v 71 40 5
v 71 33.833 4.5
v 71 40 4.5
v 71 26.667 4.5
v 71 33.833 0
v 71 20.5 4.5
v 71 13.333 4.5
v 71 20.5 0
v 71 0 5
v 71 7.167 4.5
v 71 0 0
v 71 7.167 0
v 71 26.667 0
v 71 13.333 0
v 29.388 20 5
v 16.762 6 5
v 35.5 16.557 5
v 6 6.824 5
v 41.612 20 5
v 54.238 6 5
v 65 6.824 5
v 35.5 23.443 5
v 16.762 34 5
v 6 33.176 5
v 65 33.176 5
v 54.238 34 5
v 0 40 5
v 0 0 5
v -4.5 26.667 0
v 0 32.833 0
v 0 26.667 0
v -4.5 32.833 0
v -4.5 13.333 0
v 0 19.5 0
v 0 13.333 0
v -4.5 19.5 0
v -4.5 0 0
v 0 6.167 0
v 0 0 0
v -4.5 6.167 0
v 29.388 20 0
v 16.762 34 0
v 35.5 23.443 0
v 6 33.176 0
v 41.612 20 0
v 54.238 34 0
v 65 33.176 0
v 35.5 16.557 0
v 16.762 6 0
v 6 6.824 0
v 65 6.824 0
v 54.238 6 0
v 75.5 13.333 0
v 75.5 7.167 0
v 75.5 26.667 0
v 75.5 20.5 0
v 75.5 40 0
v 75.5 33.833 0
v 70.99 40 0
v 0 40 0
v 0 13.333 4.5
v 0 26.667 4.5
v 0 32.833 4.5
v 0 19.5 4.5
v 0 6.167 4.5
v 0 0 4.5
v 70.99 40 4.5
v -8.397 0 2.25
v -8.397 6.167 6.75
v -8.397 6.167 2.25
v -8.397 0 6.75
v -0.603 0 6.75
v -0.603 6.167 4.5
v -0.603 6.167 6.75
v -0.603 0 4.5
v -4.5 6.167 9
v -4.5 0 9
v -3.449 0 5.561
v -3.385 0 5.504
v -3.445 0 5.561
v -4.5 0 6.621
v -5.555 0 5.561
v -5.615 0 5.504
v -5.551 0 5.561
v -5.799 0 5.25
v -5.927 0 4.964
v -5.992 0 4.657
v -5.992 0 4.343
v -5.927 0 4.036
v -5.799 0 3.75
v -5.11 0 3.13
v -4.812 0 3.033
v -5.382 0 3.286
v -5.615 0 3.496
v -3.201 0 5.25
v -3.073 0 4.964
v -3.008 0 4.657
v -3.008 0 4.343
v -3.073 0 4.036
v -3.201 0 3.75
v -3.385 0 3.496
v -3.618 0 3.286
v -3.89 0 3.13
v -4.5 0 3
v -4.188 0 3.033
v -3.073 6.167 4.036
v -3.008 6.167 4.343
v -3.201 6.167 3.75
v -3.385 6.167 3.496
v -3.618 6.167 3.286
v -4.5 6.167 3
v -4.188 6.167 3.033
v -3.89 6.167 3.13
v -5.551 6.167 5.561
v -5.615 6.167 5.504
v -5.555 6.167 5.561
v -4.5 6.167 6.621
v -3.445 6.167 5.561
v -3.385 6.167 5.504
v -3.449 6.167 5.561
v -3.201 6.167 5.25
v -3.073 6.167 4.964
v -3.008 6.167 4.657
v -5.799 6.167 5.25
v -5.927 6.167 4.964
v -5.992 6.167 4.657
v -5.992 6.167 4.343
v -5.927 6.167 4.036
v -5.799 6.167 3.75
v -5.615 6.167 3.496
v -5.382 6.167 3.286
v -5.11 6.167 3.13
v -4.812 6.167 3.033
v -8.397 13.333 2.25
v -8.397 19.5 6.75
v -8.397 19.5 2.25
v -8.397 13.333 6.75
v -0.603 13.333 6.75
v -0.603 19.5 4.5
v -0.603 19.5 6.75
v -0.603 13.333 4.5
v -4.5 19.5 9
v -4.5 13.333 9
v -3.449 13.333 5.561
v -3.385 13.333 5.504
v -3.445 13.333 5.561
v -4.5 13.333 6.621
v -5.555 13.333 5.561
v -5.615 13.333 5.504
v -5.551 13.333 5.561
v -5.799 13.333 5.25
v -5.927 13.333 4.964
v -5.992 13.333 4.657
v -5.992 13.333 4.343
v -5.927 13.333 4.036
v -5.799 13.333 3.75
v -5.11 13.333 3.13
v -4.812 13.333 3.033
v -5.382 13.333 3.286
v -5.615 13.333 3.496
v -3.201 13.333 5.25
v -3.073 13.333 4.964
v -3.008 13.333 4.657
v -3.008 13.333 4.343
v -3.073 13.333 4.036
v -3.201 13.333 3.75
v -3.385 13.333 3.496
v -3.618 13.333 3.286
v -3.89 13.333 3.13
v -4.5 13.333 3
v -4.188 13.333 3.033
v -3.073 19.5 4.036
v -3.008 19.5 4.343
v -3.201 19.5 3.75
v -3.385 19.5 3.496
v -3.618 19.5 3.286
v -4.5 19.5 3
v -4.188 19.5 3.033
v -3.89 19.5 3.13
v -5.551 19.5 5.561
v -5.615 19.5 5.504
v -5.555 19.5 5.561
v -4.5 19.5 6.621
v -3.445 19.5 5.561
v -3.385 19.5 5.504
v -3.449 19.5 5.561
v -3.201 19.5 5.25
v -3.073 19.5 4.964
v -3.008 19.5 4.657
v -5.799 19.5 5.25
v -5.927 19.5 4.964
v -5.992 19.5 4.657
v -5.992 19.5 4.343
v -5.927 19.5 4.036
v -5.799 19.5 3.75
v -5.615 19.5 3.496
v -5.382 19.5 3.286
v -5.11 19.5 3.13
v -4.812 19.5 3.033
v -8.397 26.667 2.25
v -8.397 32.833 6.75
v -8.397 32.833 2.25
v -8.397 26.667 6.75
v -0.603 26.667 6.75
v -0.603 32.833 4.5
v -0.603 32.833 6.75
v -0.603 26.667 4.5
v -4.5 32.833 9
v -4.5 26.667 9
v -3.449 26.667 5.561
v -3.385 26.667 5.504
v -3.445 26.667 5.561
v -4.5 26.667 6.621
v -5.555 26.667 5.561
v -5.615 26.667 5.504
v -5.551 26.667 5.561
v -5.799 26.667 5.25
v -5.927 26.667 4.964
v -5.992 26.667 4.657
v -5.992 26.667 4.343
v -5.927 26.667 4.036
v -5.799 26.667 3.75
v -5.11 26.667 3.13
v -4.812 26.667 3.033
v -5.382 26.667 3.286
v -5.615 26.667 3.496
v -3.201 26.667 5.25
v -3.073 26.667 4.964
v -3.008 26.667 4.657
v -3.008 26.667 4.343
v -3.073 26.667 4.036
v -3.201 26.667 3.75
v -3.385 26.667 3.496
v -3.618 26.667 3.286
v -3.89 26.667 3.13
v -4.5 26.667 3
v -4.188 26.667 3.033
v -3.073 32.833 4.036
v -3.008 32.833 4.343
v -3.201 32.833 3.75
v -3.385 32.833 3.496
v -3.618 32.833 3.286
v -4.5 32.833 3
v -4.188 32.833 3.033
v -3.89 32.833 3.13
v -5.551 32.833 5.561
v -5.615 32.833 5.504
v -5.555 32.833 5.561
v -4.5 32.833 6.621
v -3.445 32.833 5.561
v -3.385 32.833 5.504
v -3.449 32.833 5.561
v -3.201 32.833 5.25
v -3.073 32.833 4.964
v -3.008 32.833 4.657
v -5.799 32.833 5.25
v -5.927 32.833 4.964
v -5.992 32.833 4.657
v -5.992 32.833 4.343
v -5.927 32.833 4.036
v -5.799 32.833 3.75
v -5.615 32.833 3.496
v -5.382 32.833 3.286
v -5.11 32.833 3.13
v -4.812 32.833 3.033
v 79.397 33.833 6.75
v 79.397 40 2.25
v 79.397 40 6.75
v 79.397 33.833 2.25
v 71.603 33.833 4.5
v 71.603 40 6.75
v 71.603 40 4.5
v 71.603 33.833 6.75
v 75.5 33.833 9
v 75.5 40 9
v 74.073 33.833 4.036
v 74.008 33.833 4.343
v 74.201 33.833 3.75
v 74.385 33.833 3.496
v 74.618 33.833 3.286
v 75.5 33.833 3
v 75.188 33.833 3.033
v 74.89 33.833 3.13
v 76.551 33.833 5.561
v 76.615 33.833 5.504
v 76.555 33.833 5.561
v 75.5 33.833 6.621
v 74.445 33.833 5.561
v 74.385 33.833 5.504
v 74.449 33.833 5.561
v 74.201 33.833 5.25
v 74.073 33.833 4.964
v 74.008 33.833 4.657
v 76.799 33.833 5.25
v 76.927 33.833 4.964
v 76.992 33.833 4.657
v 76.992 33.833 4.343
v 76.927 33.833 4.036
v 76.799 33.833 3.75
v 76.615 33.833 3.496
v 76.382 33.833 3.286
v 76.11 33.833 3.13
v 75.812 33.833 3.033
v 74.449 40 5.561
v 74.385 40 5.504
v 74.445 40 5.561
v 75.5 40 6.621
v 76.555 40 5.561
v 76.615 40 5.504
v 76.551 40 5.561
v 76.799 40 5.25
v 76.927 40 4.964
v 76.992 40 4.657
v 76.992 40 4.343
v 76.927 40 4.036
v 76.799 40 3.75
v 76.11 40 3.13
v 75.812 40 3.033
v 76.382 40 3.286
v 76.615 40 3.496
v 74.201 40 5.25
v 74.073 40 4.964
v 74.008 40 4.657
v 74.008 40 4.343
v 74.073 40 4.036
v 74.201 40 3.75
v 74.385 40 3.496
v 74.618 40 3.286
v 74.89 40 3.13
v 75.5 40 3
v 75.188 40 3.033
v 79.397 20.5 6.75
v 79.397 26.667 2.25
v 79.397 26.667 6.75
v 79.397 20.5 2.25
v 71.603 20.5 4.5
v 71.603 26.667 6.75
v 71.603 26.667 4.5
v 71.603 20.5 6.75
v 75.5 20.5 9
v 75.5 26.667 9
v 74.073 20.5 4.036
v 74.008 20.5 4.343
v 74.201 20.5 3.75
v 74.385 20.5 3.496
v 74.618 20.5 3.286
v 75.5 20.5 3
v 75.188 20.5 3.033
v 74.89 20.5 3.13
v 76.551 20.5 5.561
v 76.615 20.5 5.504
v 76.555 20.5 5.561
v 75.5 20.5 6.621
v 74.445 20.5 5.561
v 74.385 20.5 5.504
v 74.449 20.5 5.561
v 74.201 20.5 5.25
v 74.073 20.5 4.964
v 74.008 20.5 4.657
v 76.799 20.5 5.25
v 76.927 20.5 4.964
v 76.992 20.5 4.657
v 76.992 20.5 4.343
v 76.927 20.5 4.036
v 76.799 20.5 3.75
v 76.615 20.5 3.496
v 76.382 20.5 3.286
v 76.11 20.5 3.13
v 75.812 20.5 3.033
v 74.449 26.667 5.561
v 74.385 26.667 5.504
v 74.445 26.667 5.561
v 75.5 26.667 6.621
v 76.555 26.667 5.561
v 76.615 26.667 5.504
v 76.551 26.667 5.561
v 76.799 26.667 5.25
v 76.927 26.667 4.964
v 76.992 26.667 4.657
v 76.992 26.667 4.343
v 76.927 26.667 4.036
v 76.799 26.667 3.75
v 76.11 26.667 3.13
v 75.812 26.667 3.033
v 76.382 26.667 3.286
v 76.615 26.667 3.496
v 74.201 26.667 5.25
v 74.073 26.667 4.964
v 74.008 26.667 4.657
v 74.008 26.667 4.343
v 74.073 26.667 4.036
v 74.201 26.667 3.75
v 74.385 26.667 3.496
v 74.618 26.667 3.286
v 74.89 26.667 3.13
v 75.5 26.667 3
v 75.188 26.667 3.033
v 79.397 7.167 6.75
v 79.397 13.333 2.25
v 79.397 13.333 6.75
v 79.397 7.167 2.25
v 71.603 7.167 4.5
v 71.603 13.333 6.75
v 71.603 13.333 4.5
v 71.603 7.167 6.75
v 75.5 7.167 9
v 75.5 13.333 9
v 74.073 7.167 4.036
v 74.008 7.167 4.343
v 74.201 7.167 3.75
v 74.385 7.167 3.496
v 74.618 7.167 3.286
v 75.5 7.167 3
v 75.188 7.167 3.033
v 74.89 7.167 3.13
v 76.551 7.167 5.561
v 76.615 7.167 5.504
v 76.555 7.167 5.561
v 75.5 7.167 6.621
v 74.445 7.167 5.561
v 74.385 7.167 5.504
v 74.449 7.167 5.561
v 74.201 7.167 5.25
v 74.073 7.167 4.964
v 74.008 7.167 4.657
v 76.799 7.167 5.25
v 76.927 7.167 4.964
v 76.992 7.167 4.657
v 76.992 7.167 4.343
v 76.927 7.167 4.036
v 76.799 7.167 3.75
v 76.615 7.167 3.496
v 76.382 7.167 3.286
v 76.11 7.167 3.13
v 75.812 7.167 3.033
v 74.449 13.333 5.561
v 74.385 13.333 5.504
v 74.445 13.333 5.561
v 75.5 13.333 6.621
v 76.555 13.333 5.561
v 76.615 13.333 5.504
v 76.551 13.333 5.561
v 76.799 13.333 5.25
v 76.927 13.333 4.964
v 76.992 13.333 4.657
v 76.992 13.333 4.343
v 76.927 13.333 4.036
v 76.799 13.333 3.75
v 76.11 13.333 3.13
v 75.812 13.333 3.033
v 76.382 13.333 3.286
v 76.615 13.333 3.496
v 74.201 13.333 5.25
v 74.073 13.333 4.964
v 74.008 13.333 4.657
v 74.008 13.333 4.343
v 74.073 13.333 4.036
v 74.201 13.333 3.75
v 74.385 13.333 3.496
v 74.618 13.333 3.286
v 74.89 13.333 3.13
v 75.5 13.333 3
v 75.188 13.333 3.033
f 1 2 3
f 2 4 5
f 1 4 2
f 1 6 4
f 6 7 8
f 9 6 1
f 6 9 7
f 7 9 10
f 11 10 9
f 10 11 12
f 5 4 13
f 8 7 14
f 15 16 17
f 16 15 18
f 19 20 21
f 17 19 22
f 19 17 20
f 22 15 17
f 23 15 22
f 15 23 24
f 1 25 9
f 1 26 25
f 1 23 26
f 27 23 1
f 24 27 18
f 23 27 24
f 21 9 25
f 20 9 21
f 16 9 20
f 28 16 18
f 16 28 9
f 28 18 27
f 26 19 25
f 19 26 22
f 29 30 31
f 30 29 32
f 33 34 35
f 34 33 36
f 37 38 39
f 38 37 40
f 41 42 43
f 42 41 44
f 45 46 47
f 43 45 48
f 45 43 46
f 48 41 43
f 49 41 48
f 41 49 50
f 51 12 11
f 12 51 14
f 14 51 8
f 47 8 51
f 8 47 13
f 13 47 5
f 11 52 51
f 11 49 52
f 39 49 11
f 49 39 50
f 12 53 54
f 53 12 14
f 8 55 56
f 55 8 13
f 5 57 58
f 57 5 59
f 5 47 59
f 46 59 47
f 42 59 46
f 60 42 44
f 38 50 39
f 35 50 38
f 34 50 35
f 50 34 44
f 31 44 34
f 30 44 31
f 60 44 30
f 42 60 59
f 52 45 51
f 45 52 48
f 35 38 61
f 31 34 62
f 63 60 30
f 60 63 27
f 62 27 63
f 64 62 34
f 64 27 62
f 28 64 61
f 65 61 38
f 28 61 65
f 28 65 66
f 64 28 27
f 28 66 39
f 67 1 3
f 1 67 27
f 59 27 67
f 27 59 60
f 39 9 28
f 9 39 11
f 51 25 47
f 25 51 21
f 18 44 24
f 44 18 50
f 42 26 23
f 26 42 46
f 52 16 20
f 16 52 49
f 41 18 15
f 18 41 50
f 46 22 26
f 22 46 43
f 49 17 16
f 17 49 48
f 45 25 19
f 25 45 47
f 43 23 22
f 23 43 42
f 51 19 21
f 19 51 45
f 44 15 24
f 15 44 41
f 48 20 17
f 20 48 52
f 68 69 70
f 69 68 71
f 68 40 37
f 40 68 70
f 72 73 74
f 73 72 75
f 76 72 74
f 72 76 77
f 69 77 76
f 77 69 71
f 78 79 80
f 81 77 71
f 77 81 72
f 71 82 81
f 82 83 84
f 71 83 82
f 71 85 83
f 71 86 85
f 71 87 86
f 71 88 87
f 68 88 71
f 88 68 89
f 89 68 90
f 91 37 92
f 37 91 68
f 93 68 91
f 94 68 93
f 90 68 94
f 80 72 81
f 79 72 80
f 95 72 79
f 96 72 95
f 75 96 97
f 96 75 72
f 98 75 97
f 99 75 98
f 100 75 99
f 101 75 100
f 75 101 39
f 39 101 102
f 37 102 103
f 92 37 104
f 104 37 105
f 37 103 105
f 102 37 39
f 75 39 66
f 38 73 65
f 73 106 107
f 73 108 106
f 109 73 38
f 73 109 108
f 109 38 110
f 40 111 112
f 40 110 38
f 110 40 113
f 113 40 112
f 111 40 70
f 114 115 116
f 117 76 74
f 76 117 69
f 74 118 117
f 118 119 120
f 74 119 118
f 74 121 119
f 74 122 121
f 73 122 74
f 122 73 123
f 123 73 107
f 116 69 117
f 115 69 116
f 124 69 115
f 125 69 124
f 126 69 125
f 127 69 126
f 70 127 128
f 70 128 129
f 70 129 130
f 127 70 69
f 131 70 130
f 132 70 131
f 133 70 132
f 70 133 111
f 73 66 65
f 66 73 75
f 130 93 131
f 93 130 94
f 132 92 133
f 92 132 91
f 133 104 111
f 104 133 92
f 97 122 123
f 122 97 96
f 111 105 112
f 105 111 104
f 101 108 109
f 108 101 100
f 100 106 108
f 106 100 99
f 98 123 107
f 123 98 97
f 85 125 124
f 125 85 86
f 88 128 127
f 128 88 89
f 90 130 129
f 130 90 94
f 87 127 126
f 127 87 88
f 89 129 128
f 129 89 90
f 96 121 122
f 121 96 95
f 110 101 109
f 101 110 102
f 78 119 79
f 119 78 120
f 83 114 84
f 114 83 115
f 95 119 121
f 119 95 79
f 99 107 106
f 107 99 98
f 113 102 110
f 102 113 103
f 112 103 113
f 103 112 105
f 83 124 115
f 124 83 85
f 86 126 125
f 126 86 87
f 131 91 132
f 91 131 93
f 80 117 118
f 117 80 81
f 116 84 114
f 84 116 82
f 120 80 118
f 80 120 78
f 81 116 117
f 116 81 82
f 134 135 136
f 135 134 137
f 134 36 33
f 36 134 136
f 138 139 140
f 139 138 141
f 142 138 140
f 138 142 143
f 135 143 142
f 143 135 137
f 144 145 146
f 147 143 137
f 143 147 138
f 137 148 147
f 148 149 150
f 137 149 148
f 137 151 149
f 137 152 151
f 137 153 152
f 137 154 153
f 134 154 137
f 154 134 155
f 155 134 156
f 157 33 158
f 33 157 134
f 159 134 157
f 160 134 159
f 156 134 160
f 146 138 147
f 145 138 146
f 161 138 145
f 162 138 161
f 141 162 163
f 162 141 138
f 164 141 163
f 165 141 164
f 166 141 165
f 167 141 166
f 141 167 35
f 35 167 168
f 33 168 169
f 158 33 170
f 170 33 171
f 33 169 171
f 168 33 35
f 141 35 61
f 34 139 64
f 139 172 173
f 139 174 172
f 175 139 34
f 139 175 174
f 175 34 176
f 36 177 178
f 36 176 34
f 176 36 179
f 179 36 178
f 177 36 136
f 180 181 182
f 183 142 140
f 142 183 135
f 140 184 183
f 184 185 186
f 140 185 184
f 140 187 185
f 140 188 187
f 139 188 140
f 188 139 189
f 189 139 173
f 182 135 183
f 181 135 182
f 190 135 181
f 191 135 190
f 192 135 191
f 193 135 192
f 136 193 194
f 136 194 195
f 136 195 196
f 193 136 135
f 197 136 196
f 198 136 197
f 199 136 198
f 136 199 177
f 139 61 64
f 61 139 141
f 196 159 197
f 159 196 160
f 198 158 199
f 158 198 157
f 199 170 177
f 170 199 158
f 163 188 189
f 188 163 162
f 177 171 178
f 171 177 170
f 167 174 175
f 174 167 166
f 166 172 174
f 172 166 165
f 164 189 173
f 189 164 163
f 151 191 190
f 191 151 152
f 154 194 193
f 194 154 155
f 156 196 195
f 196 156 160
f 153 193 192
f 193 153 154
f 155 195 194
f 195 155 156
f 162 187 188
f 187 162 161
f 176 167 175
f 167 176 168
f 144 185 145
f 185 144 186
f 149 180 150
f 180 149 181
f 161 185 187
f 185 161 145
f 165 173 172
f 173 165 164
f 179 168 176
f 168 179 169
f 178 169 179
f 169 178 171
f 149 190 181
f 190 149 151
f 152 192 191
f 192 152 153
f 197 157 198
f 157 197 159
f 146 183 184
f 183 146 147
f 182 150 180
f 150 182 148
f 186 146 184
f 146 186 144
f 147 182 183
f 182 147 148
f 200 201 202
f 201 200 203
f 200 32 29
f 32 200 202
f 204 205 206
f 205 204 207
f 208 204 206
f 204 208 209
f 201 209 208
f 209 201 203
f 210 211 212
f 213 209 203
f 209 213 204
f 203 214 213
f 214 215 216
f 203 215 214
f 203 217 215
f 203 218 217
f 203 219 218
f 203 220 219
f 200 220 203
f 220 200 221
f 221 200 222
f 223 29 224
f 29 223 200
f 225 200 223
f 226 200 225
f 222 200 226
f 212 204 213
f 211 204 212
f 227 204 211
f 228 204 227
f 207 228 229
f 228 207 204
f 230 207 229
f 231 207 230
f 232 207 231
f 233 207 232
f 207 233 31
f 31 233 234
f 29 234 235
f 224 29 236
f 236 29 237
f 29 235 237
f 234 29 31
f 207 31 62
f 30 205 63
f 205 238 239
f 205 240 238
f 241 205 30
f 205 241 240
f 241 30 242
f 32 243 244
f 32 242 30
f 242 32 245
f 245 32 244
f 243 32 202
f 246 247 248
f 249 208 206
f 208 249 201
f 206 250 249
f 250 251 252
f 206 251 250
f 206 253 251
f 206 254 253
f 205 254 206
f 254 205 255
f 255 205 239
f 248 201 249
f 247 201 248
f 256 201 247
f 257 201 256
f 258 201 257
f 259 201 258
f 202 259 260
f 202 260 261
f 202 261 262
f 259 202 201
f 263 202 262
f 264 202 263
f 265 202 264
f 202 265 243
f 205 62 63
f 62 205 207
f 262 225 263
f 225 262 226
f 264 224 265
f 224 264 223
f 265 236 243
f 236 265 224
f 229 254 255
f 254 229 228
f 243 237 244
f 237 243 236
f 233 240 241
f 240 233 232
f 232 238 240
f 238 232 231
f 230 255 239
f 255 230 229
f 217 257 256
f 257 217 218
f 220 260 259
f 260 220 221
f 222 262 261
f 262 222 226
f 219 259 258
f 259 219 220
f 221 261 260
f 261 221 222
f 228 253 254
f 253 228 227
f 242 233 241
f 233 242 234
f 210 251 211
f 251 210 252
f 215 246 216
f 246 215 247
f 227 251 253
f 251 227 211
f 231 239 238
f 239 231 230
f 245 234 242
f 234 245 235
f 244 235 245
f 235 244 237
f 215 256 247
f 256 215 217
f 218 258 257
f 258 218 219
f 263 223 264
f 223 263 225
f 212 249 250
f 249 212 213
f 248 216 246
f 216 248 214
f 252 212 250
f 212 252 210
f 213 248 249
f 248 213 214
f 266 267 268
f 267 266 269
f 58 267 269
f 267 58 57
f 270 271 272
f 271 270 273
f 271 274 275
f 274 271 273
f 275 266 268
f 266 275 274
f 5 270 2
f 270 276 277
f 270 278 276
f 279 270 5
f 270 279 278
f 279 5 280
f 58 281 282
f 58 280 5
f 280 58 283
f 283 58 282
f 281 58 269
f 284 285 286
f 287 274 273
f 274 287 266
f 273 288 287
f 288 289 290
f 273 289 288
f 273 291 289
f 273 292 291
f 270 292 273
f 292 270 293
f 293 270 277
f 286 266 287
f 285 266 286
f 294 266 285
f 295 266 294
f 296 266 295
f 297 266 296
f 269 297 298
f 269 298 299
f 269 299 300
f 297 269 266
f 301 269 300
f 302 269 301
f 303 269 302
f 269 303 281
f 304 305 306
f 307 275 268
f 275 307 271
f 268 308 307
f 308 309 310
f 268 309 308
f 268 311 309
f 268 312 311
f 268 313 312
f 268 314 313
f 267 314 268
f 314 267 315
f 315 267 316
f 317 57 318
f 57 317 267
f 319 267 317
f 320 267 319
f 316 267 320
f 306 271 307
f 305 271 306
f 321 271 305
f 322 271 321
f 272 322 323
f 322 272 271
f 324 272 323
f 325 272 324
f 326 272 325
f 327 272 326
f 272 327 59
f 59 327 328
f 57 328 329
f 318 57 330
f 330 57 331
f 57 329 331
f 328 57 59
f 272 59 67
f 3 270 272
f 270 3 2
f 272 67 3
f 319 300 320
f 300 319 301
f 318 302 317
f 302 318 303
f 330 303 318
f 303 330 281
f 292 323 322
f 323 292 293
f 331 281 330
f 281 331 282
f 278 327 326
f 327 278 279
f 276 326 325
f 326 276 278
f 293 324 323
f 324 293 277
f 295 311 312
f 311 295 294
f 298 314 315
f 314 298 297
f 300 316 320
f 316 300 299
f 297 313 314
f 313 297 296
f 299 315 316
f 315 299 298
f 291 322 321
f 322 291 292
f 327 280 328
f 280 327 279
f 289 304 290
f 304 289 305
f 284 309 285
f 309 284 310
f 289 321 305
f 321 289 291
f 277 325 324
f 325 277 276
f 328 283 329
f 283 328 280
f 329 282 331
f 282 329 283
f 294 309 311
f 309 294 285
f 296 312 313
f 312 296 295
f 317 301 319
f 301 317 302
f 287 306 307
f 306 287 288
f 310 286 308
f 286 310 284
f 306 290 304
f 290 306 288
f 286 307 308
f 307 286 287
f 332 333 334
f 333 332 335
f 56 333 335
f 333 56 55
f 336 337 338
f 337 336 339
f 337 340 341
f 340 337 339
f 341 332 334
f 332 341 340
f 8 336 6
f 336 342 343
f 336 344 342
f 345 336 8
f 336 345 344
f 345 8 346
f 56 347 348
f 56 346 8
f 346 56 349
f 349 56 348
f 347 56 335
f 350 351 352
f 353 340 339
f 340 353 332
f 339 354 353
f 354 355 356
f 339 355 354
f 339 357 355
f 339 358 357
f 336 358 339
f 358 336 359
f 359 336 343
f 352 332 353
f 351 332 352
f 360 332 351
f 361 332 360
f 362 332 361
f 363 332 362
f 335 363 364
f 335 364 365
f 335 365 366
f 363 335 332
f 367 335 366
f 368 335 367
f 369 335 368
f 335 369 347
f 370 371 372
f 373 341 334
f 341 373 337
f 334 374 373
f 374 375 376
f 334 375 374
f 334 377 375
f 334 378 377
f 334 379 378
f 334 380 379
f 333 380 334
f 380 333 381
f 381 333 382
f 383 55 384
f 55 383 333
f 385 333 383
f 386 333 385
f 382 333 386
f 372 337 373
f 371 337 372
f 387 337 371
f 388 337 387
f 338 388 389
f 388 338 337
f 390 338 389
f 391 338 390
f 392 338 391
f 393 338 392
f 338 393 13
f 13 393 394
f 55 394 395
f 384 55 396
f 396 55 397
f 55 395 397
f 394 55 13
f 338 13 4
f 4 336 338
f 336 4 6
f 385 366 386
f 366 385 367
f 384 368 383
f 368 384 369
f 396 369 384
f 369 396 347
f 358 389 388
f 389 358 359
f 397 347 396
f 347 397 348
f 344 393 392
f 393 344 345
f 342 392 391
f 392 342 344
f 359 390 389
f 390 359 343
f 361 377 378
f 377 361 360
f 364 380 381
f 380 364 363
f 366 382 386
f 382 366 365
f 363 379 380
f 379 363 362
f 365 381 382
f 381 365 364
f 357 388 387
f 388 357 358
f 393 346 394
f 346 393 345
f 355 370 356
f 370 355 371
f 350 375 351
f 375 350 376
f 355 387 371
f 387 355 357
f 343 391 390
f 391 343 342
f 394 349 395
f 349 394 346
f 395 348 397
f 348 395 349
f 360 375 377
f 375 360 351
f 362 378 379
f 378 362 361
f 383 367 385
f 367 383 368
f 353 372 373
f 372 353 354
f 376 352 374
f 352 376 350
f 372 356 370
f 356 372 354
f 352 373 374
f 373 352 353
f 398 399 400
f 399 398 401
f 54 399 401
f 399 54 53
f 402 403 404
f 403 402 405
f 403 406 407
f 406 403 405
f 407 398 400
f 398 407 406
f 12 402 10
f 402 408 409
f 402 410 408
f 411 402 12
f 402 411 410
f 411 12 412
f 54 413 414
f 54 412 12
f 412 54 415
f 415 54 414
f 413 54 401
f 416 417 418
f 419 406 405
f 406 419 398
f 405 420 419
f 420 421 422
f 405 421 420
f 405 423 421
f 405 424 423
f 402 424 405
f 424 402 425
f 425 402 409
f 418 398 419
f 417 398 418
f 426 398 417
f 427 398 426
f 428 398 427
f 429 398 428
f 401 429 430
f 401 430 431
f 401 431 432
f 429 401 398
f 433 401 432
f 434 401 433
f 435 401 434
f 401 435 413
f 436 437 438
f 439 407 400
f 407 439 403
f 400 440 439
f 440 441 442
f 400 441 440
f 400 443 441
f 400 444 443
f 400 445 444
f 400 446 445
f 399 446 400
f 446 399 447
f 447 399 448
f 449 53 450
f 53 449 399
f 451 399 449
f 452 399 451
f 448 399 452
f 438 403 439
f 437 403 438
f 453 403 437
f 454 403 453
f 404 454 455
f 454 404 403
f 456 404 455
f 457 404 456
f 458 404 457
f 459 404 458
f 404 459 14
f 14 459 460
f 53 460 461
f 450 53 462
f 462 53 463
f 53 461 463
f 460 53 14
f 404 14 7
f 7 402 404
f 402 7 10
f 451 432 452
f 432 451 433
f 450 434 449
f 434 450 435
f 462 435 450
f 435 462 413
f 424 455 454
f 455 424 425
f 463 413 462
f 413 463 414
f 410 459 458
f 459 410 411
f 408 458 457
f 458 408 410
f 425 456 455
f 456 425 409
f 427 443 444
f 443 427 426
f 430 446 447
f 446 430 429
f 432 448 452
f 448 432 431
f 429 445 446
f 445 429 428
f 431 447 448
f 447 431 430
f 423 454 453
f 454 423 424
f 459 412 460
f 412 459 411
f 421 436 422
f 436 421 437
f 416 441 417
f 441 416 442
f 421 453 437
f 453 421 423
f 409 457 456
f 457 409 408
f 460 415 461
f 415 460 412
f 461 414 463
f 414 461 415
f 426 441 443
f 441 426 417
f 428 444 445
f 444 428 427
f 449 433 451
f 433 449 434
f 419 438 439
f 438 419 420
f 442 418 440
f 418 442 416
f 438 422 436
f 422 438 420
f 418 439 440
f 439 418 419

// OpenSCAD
use <MCAD/teardrop.scad>
use <MCAD/math.scad>

sarrus_link(length = 80, width = 40, depth = 5, truss_width = 6, hinge_radius = 1.5, hinge_wall = 3, hinge_clearance = 1, num_hinges = 3);
//hinge(1.5,3,10);

module sarrus_link(length, width, depth, truss_width, hinge_radius, hinge_wall, hinge_clearance, num_hinges) {
	body_length = length - 2 * (hinge_wall + hinge_radius);
	union(){
		// main body
		main_body(body_length, width, depth, truss_width);
		// left side hinges
		
		for ( i = [0 : num_hinges-1]) {
			translate([-(hinge_radius + hinge_wall),i * width/num_hinges ,0])
				hinge(hinge_radius, hinge_wall, (width/(2*num_hinges)) - hinge_clearance/2);
		}
		// right side hinges
		for ( i = [0 : num_hinges-1]) {
			translate([length-(hinge_radius + hinge_wall),(width+ hinge_clearance/2- (width/(2*num_hinges)))-(i * width/num_hinges) ,0])
				mirror([1,0,0])
					hinge(hinge_radius, hinge_wall, (width/(2*num_hinges)) - hinge_clearance/2);
		}
	}
}

module hinge(hole_radius, wall, depth){
	difference(){
		union(){
			translate([0,depth,wall + hole_radius])
			rotate([0,90,-90])
			{
				// hex body
				cylinder(r = hole_radius + wall,, h = depth, $fn=6);
				// mounting square
				cube(size=[hole_radius + wall, 0.01 + hole_radius + wall, depth]);
			}
		}
		// teardrop hole
		translate([0,depth/2,wall + hole_radius])
			rotate([0,0,90])
				teardrop(radius=hole_radius,  length = 1.1* depth, angle=90);
	}
}
module main_body(length, width, depth, truss_width){
	union(){
		// body block
		difference(){
			cube(size=[length, width, depth]);
			translate([truss_width, truss_width, -0.5]) 
				cube(size=[length - 2 * truss_width, width - 2 * truss_width, depth+1]);
		}
		truss(length, width, depth, truss_width);
	}
}

module truss(length, width, depth, truss_width){
	intersection(){
		cube(size=[length, width, depth]);
		union(){
		rotate([0,0,atan((width/length))])
			translate([0,-truss_width/2,0])
				cube(size=[length* 1.5, truss_width, depth]);
		translate([0,width,0])
			rotate([0,0,-atan((width/length))])
				translate([0,-truss_width/2,0])
					cube(size=[length* 1.5, truss_width, depth]);		
		}
    }
}
